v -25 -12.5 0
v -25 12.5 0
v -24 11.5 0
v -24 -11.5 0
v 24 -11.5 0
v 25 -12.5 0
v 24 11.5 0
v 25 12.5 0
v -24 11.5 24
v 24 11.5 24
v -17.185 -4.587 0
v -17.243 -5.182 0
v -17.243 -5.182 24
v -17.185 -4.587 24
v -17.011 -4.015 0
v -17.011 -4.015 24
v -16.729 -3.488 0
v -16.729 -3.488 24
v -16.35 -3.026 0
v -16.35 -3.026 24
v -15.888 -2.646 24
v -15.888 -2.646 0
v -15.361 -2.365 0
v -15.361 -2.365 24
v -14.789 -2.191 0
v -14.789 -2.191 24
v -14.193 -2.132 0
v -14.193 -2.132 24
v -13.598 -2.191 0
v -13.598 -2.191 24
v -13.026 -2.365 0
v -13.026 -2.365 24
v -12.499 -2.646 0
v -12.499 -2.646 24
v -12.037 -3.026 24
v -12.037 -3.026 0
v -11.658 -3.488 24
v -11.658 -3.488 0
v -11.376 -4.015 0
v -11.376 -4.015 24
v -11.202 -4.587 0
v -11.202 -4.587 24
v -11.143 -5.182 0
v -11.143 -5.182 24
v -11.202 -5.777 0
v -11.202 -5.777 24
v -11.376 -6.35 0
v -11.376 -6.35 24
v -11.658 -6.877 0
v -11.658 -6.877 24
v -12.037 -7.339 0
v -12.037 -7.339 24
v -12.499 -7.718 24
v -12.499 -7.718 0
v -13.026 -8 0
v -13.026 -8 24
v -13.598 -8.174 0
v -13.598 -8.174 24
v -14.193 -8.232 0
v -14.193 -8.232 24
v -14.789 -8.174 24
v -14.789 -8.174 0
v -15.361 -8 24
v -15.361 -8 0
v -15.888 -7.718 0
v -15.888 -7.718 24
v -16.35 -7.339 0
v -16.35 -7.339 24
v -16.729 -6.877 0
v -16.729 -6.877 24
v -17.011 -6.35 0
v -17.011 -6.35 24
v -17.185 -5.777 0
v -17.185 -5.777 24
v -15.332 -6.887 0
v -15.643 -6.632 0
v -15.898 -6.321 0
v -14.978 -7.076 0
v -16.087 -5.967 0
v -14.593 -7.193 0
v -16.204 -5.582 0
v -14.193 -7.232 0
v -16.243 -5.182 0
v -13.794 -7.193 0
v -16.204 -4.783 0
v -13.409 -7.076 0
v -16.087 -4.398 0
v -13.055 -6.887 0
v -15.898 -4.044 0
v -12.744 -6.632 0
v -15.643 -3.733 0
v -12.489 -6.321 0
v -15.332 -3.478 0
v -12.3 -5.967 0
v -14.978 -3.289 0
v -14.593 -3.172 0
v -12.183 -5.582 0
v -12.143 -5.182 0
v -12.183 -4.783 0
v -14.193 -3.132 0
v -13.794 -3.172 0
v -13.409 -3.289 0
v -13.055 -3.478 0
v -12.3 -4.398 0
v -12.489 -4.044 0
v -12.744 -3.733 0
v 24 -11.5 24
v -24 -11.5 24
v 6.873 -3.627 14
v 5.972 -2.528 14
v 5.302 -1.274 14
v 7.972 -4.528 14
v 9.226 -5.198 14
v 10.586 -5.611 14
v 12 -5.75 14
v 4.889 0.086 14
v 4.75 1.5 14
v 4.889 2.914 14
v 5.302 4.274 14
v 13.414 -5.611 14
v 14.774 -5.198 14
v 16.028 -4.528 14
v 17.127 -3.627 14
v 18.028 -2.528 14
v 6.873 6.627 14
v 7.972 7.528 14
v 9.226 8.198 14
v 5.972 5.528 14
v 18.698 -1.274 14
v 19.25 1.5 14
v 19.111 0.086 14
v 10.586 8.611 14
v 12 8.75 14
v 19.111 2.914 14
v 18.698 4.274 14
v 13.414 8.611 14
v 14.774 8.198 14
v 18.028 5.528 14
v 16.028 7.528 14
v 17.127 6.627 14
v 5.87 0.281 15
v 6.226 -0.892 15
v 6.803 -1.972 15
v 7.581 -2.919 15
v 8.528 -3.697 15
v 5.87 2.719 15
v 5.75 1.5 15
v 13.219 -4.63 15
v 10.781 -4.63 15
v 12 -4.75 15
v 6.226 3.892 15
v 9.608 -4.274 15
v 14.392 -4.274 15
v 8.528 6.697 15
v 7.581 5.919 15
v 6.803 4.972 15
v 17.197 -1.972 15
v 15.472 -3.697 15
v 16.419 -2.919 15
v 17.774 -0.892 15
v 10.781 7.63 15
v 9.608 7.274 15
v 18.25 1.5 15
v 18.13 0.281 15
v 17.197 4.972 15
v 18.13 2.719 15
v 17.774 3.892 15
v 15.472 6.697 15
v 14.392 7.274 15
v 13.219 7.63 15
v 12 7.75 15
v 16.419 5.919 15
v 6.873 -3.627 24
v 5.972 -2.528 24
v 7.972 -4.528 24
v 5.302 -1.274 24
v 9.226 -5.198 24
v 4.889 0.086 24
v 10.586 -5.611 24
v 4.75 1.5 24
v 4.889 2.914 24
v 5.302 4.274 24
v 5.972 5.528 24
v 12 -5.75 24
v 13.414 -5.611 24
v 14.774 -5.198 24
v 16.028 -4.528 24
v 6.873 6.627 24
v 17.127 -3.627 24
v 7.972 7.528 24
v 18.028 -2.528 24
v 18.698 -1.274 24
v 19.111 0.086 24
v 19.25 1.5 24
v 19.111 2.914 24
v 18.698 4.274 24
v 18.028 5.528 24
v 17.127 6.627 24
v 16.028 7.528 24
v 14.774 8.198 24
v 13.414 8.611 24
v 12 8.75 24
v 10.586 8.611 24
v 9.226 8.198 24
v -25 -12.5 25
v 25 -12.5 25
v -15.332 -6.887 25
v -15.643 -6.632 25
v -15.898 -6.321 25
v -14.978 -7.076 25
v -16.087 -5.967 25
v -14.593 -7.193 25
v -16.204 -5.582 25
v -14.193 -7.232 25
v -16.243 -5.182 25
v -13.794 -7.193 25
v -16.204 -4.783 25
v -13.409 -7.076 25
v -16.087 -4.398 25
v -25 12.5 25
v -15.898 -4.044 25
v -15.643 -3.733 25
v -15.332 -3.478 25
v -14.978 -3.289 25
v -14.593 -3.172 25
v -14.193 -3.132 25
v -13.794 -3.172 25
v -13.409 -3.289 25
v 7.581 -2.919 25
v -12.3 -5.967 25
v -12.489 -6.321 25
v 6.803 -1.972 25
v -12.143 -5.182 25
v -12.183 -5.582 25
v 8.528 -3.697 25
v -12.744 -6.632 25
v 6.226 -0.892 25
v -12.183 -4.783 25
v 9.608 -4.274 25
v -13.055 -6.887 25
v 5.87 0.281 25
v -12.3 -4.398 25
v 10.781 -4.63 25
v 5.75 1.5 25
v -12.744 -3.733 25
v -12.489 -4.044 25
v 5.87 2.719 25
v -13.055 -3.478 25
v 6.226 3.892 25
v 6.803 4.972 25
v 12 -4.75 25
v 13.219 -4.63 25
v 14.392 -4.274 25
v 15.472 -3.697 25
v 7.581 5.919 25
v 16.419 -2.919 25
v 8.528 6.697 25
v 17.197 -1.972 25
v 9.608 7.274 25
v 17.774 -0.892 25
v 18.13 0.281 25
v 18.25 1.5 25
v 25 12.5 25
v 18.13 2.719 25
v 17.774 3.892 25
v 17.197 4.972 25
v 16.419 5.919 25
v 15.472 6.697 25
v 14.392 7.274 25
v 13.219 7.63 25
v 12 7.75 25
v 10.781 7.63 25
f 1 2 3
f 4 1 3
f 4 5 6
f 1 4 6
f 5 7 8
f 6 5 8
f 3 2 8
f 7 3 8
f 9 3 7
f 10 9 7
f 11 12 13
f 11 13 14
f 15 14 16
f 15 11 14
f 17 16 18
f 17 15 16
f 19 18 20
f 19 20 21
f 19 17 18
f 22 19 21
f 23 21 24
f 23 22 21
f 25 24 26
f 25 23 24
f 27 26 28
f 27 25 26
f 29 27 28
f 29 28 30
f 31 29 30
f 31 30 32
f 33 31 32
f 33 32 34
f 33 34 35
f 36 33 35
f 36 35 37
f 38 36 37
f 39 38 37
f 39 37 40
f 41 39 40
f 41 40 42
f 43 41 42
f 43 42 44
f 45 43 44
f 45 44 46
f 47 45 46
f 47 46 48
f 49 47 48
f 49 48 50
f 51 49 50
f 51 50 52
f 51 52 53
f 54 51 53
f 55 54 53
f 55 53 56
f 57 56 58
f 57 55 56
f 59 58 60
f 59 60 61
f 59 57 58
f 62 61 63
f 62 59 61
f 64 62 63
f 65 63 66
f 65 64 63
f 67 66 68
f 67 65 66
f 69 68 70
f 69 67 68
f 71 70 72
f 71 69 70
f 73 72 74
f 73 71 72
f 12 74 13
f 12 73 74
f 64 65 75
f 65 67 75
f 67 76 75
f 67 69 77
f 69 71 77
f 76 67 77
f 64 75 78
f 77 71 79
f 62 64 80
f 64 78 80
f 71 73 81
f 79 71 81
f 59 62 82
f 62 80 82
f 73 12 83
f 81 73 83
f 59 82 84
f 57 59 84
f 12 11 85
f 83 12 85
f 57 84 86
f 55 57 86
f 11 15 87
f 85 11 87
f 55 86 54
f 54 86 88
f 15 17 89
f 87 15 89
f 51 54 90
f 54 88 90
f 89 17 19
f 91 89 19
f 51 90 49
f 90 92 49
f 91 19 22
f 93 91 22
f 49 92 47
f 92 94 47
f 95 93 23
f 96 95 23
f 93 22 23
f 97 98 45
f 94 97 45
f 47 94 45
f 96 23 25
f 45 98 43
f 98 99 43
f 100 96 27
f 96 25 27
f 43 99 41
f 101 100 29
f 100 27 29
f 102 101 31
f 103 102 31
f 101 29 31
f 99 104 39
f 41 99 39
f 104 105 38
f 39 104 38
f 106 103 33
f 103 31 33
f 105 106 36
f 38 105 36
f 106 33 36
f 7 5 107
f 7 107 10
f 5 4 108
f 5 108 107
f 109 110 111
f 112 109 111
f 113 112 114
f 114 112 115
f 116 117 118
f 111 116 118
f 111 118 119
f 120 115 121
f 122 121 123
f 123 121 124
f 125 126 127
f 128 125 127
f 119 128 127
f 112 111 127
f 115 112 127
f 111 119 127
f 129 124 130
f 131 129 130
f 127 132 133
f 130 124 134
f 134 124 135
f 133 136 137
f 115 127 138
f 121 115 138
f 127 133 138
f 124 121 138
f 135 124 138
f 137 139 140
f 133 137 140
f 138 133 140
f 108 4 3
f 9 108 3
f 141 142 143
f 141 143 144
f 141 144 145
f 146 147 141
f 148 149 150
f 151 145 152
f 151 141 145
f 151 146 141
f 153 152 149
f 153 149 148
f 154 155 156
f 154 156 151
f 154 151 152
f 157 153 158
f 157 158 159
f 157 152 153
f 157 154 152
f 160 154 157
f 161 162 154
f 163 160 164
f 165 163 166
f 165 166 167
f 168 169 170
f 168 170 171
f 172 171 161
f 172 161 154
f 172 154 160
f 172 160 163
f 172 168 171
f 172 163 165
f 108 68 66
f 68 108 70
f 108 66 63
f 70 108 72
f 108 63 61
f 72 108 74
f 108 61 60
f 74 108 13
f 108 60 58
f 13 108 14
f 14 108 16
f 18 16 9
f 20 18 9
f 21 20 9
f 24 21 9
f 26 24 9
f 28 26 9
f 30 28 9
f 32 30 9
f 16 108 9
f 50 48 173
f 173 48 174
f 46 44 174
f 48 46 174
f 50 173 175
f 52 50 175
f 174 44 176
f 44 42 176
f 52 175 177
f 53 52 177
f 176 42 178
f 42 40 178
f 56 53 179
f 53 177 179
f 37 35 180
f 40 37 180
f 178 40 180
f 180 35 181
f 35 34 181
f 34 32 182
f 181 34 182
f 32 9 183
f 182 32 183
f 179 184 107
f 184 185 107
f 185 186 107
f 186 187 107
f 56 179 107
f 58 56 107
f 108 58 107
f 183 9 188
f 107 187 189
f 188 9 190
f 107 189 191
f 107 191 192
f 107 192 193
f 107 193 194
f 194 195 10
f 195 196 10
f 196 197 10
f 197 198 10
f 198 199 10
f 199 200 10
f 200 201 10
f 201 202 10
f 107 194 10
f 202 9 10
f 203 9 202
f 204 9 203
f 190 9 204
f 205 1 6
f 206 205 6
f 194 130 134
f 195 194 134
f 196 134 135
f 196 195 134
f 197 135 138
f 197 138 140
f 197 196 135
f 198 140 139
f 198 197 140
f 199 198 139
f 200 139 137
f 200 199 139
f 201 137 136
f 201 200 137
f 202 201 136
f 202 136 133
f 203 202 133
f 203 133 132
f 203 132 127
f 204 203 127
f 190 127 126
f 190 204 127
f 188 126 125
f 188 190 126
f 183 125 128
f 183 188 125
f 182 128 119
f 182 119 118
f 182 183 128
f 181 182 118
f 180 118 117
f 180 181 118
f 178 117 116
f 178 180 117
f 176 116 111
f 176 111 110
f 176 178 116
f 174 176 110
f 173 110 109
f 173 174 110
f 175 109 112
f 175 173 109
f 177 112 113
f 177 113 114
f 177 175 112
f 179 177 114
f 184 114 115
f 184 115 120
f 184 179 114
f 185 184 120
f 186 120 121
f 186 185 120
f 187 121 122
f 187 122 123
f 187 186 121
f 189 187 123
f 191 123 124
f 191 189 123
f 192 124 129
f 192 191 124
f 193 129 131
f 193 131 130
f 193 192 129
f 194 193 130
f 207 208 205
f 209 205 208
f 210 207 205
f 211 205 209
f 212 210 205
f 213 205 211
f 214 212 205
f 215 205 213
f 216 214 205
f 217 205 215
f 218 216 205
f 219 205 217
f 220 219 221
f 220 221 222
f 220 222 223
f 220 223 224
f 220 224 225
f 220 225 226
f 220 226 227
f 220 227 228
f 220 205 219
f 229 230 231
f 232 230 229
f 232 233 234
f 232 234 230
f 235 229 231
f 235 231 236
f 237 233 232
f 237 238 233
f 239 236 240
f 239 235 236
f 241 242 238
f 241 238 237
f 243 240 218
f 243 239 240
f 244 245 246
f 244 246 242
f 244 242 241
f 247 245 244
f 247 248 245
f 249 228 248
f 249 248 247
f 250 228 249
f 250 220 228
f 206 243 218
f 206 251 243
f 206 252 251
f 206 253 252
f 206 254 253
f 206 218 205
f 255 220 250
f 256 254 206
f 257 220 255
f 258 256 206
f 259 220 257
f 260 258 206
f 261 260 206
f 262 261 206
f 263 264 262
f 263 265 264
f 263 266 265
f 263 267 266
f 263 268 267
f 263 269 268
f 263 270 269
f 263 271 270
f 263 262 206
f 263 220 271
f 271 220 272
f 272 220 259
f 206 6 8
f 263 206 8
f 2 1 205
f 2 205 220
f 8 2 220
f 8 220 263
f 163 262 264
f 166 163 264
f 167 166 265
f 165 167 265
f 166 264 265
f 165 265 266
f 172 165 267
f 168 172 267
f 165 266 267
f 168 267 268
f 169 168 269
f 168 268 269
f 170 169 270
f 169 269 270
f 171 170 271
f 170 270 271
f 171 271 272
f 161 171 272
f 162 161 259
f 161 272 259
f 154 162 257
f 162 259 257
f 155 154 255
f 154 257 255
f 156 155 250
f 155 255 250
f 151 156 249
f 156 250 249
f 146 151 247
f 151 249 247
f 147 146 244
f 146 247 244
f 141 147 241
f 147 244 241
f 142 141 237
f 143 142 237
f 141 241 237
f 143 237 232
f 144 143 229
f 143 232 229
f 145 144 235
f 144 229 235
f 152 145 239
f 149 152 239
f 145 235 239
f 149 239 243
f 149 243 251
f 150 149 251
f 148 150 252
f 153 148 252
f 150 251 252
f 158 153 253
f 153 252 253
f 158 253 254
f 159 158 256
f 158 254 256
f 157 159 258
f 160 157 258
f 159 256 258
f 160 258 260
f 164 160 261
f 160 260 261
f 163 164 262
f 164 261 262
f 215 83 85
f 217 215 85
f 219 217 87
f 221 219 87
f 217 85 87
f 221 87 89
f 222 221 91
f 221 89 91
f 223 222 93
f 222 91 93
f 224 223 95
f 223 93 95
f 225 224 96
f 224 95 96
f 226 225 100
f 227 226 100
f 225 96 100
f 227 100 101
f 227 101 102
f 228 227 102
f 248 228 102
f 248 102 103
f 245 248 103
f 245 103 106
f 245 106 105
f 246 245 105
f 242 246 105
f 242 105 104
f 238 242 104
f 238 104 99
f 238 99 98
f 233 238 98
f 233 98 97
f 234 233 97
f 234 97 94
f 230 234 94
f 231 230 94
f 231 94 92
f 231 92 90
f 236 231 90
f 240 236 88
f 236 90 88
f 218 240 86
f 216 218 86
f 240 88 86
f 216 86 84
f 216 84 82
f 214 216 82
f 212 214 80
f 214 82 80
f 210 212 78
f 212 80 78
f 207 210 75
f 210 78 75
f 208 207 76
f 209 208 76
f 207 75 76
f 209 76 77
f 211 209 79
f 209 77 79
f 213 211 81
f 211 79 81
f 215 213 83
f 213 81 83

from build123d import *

# Parameters (mm, degrees)
F0_W     = 50
F0_H     = 25
F1_DEPTH = 25
F2_R     = 6.25
F3_DEPTH = 10
F5_D     = 4.1
F6_T     = -1


with BuildPart() as f1:
    # F0 (on Top) → F1 (new body)
    with BuildSketch(Plane.XY):
        Rectangle(F0_W, F0_H)
    extrude(amount=F1_DEPTH)

    # F2 (on face) → F3 (cut)
    with BuildSketch(Plane.XY.offset(25)):
        with Locations((12, 1.5)):
            Circle(F2_R)
    extrude(amount=-F3_DEPTH, mode=Mode.SUBTRACT)

    # F5 (through all)
    with Locations(Plane.XY.offset(25)):
        with Locations((-14.193482697, -5.1824725233)):
            Hole(F5_D / 2)

    # F6
    f6_openings = [f1.faces().sort_by_distance(p)[0] for p in [
        (0.151512, 0.055322, 0),
    ]]
    offset(amount=F6_T, openings=f6_openings, kind=Kind.INTERSECTION)


solid = f1.part
